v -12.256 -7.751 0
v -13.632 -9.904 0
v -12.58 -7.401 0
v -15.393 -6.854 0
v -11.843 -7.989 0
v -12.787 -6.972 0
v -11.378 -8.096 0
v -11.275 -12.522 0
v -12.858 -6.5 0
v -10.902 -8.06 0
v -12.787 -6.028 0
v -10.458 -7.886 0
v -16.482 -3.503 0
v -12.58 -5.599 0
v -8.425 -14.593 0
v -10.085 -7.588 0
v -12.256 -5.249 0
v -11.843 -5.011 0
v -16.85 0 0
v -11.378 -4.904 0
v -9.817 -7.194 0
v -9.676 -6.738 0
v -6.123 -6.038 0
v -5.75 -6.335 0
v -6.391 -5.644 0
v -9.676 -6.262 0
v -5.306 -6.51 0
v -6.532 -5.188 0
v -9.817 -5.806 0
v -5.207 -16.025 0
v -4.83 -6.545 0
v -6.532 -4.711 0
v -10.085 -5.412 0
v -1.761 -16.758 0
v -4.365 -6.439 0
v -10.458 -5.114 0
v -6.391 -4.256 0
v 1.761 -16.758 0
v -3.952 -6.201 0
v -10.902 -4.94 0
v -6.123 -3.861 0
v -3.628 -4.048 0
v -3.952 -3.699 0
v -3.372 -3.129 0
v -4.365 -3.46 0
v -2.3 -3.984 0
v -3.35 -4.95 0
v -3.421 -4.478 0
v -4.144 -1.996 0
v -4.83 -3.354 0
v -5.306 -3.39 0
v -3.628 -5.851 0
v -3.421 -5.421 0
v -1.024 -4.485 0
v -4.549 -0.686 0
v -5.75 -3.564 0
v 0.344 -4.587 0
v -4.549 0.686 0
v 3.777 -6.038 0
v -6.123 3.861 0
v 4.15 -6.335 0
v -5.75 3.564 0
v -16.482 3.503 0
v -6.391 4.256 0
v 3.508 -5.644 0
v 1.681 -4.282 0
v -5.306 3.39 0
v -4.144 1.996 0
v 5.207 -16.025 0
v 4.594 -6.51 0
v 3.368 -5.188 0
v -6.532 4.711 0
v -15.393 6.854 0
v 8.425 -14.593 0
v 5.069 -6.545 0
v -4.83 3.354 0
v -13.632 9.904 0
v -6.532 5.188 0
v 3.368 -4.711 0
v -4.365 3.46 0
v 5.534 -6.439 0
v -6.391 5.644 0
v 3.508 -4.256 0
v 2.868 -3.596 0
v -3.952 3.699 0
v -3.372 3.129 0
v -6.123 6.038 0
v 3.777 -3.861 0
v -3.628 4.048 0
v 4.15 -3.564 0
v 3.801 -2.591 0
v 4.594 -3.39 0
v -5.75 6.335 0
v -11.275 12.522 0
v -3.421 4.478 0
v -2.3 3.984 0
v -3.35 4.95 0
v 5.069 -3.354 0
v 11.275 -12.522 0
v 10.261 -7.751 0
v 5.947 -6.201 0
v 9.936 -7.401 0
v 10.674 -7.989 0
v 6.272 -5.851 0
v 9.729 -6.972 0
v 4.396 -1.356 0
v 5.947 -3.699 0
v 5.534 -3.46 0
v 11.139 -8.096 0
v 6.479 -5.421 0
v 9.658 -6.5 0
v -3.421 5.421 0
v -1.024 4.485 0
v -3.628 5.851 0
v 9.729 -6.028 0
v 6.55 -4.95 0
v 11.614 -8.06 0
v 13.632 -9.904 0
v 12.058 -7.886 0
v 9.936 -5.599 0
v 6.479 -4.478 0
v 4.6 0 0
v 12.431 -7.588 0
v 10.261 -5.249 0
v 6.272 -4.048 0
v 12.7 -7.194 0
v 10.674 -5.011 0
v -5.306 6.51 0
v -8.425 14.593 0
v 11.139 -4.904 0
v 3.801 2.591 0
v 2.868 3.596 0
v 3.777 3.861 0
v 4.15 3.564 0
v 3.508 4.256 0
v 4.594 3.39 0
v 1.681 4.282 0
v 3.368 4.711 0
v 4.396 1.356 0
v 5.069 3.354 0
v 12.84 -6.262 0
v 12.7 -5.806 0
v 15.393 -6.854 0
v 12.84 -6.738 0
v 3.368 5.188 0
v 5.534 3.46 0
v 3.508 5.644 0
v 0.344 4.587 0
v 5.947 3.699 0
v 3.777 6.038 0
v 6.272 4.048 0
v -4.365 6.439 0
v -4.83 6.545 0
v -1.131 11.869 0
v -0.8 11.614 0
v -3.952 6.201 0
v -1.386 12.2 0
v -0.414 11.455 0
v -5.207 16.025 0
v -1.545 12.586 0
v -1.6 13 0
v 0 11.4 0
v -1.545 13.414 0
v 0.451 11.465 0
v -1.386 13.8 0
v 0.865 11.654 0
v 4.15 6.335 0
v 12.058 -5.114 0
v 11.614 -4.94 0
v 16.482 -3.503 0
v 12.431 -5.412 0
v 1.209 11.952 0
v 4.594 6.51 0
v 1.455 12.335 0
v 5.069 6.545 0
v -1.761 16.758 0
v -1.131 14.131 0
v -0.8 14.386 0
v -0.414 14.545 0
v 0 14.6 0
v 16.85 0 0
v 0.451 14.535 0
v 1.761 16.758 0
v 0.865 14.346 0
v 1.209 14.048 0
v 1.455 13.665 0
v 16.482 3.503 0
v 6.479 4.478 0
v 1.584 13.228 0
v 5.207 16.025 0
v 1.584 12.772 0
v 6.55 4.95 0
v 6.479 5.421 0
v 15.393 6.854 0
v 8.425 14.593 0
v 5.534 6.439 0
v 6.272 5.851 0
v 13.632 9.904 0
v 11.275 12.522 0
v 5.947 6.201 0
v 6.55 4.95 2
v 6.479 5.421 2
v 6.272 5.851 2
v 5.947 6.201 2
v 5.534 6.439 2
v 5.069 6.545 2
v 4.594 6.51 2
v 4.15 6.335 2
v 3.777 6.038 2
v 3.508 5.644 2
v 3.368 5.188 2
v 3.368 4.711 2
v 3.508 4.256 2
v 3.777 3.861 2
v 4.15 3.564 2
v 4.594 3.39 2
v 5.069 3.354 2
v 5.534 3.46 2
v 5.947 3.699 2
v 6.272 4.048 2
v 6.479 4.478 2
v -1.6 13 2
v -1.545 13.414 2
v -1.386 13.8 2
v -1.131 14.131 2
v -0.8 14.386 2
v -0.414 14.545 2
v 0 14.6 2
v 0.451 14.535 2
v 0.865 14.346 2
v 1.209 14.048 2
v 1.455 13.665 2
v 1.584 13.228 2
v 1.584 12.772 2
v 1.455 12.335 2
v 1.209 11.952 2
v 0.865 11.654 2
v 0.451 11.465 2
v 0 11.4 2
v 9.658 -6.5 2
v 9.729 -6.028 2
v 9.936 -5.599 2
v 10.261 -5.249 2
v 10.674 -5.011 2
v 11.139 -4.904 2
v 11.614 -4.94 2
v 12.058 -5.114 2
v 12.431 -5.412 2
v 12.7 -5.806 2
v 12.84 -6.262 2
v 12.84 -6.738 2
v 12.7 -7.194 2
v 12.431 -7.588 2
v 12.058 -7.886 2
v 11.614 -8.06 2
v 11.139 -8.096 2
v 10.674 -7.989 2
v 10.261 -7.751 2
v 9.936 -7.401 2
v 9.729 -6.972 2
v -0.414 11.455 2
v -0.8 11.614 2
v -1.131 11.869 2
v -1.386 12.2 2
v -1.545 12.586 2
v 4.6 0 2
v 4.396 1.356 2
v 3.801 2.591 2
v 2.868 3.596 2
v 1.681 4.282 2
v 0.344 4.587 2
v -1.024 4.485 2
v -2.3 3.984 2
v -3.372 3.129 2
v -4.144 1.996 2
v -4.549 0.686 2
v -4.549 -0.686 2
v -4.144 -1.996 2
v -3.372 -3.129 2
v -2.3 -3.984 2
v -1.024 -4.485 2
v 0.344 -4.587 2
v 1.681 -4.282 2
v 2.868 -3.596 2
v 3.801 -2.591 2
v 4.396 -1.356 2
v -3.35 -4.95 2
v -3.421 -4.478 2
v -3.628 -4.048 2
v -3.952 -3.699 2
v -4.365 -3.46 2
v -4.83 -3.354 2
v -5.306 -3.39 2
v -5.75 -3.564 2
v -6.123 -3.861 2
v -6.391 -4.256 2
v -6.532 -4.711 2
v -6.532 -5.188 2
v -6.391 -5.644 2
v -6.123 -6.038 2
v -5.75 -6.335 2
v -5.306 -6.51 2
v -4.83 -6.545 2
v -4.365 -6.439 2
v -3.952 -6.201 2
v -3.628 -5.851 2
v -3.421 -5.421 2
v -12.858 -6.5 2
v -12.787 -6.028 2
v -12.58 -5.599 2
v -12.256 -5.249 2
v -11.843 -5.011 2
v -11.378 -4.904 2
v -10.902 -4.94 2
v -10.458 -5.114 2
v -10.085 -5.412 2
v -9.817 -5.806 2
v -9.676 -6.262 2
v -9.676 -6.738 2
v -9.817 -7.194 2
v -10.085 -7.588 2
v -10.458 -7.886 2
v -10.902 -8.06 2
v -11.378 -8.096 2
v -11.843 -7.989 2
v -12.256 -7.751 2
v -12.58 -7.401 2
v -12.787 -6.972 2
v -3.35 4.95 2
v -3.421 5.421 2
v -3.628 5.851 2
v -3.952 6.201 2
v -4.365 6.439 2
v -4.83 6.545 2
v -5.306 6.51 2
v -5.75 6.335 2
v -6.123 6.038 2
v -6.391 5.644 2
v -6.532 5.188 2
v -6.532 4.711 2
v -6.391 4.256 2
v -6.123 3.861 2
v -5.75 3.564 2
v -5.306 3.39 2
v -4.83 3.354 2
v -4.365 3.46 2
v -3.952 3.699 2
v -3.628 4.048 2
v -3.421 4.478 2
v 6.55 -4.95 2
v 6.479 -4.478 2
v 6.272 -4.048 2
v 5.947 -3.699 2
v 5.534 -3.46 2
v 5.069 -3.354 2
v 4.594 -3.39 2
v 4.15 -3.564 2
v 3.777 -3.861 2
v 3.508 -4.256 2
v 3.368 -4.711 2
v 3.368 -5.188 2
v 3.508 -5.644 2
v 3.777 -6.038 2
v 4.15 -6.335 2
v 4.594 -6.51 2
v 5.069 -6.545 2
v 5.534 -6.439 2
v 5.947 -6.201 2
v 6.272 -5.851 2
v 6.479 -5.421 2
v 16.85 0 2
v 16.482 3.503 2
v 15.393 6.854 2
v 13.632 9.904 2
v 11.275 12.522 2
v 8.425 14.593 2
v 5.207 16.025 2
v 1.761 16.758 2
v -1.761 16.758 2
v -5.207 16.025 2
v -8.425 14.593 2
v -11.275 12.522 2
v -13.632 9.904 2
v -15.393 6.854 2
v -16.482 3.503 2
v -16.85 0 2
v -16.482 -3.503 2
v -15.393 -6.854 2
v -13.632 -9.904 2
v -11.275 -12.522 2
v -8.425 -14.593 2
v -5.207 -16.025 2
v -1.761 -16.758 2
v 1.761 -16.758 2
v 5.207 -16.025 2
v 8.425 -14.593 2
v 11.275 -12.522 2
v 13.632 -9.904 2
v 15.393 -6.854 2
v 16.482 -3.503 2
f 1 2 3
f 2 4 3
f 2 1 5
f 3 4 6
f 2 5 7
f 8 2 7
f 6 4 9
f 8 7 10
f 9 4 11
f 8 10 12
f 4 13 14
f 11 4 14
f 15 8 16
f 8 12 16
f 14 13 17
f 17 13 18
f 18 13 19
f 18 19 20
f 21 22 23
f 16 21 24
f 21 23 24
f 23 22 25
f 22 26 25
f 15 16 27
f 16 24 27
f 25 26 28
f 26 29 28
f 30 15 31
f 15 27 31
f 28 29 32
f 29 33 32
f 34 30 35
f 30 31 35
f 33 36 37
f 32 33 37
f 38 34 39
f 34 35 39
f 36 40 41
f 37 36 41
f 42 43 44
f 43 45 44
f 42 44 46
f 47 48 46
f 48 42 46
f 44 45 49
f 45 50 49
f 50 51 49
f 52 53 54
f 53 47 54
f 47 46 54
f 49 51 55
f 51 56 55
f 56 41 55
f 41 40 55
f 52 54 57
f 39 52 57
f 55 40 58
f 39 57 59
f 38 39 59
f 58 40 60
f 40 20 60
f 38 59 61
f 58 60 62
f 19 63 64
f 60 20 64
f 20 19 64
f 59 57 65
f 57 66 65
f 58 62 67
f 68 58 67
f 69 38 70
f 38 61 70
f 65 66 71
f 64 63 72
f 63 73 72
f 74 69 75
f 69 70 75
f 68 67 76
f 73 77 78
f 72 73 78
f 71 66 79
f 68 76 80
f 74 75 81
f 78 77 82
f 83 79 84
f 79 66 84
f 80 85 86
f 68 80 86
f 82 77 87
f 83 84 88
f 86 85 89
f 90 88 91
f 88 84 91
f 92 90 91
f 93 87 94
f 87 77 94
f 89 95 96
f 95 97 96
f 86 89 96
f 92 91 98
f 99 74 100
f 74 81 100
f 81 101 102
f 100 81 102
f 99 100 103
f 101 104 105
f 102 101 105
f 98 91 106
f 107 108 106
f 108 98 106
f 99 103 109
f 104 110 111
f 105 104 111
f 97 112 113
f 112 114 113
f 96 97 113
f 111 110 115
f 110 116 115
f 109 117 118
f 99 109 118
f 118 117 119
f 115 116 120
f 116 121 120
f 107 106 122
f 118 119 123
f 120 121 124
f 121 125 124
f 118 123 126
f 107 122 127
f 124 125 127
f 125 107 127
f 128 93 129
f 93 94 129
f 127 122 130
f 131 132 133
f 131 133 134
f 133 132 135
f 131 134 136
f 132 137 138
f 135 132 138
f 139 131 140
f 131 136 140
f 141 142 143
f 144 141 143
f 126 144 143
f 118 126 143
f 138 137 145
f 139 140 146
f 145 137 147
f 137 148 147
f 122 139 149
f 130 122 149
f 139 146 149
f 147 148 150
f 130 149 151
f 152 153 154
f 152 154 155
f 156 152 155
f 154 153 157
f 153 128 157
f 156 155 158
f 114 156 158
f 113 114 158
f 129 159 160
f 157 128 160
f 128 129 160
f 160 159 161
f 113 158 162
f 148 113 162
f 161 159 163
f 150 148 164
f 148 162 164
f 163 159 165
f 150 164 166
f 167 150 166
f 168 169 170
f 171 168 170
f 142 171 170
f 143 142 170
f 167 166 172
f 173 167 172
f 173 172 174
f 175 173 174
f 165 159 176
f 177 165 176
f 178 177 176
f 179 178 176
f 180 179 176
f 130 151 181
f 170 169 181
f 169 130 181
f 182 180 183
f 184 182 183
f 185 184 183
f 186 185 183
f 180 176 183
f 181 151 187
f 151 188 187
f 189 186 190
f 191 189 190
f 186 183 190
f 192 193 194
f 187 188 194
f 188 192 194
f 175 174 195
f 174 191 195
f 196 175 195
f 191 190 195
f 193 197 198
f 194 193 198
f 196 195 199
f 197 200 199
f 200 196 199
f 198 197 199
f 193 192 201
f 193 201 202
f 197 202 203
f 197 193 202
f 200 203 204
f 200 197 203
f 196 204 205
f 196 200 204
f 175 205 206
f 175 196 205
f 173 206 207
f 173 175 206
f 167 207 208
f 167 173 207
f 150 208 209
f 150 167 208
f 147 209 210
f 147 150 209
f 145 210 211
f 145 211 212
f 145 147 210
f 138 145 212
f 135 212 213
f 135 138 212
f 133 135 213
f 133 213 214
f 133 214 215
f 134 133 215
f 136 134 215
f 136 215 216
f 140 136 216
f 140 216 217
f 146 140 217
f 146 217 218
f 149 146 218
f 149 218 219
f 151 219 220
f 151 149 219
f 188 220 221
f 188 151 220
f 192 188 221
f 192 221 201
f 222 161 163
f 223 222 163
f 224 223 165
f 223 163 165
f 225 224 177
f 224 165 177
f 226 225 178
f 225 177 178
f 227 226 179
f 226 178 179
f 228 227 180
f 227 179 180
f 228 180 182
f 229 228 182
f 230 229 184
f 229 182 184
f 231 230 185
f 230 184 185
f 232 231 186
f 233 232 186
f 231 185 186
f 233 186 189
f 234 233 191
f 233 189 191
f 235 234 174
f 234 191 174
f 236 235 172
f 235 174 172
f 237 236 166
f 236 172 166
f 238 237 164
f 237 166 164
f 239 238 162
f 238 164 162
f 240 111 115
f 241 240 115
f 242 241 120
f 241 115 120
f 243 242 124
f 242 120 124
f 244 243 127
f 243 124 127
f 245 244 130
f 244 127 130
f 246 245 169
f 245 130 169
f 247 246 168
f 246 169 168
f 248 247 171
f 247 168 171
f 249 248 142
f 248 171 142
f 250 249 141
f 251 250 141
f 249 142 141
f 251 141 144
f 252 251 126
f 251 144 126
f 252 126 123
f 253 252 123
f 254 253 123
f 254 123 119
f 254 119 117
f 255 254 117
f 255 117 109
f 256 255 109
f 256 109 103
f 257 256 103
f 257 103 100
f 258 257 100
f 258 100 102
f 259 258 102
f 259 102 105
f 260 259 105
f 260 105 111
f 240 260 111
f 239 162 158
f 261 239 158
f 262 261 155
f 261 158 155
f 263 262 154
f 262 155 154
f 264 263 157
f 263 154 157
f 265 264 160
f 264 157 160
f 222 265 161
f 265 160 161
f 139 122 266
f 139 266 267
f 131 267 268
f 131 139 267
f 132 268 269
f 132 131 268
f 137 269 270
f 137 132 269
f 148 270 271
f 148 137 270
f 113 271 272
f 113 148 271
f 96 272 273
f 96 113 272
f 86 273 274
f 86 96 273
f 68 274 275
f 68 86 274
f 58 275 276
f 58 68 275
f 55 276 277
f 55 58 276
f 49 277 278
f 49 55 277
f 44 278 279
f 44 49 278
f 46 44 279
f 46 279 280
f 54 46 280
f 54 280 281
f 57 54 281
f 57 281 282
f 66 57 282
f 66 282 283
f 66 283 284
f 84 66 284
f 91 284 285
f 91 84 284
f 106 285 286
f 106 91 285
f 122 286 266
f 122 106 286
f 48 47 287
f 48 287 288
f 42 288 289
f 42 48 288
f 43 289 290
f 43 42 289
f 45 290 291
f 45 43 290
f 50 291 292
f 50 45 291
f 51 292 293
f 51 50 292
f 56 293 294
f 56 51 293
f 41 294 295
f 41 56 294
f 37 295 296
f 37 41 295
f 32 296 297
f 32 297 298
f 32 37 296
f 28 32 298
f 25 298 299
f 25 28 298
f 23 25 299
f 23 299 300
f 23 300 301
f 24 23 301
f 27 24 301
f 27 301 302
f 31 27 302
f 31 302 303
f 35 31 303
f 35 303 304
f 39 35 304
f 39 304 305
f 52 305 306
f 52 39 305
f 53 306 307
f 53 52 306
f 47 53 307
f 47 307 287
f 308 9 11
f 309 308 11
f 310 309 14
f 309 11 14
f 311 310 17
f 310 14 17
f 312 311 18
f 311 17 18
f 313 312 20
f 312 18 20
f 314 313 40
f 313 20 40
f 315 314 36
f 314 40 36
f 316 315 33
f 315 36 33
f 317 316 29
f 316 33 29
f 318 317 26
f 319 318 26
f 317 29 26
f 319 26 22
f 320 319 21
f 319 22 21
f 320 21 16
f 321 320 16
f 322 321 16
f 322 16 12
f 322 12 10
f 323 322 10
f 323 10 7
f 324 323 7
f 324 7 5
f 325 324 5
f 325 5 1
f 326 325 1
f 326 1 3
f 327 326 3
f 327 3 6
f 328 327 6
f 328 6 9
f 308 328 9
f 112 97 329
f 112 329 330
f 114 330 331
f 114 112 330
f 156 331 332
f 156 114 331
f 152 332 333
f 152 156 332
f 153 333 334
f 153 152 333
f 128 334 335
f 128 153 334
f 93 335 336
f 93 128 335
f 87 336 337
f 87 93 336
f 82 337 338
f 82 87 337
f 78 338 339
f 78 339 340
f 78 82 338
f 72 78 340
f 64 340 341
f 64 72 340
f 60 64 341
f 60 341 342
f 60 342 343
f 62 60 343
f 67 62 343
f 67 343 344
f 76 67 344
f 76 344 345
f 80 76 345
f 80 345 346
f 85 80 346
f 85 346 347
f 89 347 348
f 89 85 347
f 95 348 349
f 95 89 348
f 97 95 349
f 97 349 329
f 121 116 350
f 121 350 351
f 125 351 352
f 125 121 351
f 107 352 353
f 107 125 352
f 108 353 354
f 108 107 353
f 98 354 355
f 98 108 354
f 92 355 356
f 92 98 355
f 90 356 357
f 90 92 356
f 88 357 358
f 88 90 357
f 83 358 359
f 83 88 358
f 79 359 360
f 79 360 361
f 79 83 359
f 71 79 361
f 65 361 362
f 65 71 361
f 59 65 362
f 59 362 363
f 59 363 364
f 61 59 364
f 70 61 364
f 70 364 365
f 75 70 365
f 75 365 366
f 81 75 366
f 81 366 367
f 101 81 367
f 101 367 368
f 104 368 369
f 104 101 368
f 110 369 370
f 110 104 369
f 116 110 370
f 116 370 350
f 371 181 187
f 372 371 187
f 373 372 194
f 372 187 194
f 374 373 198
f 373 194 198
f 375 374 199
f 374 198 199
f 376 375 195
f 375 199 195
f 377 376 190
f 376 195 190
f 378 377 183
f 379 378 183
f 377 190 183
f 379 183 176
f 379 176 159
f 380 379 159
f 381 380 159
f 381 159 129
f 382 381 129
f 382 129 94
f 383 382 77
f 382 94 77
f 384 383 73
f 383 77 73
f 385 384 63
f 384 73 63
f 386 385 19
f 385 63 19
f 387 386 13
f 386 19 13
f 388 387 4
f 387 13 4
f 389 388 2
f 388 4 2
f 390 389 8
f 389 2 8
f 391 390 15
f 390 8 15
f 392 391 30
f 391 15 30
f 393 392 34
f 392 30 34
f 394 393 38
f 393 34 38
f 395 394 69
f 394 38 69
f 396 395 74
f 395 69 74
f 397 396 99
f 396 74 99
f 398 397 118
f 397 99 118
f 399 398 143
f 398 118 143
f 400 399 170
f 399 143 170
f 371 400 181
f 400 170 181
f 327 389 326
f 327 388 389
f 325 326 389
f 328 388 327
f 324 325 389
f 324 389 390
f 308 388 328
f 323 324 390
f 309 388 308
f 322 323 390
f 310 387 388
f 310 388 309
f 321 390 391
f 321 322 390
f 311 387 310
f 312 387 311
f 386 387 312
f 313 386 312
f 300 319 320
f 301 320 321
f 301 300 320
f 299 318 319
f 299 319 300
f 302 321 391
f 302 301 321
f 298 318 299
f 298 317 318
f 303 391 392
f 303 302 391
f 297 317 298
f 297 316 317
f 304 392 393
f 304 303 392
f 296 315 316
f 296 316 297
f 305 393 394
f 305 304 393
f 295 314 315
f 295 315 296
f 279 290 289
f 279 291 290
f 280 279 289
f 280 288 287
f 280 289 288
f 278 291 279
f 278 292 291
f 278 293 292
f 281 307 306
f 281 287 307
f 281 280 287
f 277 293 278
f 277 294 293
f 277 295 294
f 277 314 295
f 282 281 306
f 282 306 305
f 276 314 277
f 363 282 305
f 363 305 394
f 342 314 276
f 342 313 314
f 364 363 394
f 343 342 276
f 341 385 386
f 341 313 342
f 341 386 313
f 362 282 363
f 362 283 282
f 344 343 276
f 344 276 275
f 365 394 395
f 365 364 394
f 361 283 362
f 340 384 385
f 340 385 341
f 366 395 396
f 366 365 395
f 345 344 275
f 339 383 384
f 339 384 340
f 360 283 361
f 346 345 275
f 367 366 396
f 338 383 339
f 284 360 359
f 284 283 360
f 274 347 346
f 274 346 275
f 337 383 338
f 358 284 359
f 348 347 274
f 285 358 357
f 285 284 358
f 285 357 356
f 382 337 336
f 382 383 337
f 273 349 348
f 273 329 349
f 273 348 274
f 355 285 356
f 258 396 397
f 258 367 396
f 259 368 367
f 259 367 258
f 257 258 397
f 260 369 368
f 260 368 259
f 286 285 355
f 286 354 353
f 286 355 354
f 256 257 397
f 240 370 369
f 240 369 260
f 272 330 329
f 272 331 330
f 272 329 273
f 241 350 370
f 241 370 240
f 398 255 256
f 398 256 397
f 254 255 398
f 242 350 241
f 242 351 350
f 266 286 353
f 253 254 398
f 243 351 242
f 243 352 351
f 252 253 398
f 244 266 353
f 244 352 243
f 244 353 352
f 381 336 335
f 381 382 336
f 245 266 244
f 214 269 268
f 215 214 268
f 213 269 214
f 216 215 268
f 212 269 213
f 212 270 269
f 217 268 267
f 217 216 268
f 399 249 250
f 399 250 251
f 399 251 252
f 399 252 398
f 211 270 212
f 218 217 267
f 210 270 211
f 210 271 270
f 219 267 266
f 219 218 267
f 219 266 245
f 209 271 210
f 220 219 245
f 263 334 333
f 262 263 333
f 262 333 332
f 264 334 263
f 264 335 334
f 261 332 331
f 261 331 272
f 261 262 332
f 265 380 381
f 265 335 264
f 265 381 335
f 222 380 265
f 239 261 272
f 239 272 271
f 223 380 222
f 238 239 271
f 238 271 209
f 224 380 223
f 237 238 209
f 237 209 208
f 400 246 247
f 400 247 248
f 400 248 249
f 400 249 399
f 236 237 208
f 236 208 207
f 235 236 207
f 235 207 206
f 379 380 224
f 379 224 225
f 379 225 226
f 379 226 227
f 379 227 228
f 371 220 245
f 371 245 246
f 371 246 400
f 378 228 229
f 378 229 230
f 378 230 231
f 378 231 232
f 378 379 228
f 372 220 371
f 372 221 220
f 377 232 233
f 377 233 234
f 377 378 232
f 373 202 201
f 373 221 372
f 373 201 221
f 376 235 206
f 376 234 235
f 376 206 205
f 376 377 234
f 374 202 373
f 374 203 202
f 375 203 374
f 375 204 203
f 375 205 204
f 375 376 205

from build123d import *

# Parameters (mm, degrees)
SKETCH_1_R          = 16.85
SKETCH_1_R_2        = 1.6
SKETCH_1_R_3        = 4.6
EXTRUDE_1_DEPTH     = 2
SKETCH_2_R          = 1.6
CUT_EXTRUDE_1_DEPTH = 3


with BuildPart() as part:
    # 草图1 → 凸台-拉伸1 (new body)
    with BuildSketch(Plane.XY):
        Circle(SKETCH_1_R)
        with Locations((-4.949747468, 4.949747468)):
            Circle(SKETCH_1_R_2, mode=Mode.SUBTRACT)
        with Locations((-4.949747468, -4.949747468)):
            Circle(SKETCH_1_R_2, mode=Mode.SUBTRACT)
        with Locations((4.949747468, -4.949747468)):
            Circle(SKETCH_1_R_2, mode=Mode.SUBTRACT)
        with Locations((4.949747468, 4.949747468)):
            Circle(SKETCH_1_R_2, mode=Mode.SUBTRACT)
        Circle(SKETCH_1_R_3, mode=Mode.SUBTRACT)
    extrude(amount=EXTRUDE_1_DEPTH)

    # 草图2 → 切除-拉伸1 (cut, through all)
    with BuildSketch(Plane(origin=(0, 0, 0), x_dir=(-1, 0, 0), z_dir=(0, 0, -1))):
        with BuildLine():
            ThreePointArc((0, 14.6), (-1.6, 13), (0, 11.4))
            Line((0, 11.4), (0, 14.6))
        make_face()
        with BuildLine():
            Line((0, 14.6), (0, 11.4))
            ThreePointArc((0, 11.4), (1.13137085, 11.86862915), (1.6, 13))
            ThreePointArc((1.6, 13), (1.13137085, 14.13137085), (0, 14.6))
        make_face()
        with Locations((-11.258330249, -6.5)):
            Circle(SKETCH_2_R)
        with Locations((11.258330249, -6.5)):
            Circle(SKETCH_2_R)
    extrude(amount=-CUT_EXTRUDE_1_DEPTH, mode=Mode.SUBTRACT)


solid = part.part
